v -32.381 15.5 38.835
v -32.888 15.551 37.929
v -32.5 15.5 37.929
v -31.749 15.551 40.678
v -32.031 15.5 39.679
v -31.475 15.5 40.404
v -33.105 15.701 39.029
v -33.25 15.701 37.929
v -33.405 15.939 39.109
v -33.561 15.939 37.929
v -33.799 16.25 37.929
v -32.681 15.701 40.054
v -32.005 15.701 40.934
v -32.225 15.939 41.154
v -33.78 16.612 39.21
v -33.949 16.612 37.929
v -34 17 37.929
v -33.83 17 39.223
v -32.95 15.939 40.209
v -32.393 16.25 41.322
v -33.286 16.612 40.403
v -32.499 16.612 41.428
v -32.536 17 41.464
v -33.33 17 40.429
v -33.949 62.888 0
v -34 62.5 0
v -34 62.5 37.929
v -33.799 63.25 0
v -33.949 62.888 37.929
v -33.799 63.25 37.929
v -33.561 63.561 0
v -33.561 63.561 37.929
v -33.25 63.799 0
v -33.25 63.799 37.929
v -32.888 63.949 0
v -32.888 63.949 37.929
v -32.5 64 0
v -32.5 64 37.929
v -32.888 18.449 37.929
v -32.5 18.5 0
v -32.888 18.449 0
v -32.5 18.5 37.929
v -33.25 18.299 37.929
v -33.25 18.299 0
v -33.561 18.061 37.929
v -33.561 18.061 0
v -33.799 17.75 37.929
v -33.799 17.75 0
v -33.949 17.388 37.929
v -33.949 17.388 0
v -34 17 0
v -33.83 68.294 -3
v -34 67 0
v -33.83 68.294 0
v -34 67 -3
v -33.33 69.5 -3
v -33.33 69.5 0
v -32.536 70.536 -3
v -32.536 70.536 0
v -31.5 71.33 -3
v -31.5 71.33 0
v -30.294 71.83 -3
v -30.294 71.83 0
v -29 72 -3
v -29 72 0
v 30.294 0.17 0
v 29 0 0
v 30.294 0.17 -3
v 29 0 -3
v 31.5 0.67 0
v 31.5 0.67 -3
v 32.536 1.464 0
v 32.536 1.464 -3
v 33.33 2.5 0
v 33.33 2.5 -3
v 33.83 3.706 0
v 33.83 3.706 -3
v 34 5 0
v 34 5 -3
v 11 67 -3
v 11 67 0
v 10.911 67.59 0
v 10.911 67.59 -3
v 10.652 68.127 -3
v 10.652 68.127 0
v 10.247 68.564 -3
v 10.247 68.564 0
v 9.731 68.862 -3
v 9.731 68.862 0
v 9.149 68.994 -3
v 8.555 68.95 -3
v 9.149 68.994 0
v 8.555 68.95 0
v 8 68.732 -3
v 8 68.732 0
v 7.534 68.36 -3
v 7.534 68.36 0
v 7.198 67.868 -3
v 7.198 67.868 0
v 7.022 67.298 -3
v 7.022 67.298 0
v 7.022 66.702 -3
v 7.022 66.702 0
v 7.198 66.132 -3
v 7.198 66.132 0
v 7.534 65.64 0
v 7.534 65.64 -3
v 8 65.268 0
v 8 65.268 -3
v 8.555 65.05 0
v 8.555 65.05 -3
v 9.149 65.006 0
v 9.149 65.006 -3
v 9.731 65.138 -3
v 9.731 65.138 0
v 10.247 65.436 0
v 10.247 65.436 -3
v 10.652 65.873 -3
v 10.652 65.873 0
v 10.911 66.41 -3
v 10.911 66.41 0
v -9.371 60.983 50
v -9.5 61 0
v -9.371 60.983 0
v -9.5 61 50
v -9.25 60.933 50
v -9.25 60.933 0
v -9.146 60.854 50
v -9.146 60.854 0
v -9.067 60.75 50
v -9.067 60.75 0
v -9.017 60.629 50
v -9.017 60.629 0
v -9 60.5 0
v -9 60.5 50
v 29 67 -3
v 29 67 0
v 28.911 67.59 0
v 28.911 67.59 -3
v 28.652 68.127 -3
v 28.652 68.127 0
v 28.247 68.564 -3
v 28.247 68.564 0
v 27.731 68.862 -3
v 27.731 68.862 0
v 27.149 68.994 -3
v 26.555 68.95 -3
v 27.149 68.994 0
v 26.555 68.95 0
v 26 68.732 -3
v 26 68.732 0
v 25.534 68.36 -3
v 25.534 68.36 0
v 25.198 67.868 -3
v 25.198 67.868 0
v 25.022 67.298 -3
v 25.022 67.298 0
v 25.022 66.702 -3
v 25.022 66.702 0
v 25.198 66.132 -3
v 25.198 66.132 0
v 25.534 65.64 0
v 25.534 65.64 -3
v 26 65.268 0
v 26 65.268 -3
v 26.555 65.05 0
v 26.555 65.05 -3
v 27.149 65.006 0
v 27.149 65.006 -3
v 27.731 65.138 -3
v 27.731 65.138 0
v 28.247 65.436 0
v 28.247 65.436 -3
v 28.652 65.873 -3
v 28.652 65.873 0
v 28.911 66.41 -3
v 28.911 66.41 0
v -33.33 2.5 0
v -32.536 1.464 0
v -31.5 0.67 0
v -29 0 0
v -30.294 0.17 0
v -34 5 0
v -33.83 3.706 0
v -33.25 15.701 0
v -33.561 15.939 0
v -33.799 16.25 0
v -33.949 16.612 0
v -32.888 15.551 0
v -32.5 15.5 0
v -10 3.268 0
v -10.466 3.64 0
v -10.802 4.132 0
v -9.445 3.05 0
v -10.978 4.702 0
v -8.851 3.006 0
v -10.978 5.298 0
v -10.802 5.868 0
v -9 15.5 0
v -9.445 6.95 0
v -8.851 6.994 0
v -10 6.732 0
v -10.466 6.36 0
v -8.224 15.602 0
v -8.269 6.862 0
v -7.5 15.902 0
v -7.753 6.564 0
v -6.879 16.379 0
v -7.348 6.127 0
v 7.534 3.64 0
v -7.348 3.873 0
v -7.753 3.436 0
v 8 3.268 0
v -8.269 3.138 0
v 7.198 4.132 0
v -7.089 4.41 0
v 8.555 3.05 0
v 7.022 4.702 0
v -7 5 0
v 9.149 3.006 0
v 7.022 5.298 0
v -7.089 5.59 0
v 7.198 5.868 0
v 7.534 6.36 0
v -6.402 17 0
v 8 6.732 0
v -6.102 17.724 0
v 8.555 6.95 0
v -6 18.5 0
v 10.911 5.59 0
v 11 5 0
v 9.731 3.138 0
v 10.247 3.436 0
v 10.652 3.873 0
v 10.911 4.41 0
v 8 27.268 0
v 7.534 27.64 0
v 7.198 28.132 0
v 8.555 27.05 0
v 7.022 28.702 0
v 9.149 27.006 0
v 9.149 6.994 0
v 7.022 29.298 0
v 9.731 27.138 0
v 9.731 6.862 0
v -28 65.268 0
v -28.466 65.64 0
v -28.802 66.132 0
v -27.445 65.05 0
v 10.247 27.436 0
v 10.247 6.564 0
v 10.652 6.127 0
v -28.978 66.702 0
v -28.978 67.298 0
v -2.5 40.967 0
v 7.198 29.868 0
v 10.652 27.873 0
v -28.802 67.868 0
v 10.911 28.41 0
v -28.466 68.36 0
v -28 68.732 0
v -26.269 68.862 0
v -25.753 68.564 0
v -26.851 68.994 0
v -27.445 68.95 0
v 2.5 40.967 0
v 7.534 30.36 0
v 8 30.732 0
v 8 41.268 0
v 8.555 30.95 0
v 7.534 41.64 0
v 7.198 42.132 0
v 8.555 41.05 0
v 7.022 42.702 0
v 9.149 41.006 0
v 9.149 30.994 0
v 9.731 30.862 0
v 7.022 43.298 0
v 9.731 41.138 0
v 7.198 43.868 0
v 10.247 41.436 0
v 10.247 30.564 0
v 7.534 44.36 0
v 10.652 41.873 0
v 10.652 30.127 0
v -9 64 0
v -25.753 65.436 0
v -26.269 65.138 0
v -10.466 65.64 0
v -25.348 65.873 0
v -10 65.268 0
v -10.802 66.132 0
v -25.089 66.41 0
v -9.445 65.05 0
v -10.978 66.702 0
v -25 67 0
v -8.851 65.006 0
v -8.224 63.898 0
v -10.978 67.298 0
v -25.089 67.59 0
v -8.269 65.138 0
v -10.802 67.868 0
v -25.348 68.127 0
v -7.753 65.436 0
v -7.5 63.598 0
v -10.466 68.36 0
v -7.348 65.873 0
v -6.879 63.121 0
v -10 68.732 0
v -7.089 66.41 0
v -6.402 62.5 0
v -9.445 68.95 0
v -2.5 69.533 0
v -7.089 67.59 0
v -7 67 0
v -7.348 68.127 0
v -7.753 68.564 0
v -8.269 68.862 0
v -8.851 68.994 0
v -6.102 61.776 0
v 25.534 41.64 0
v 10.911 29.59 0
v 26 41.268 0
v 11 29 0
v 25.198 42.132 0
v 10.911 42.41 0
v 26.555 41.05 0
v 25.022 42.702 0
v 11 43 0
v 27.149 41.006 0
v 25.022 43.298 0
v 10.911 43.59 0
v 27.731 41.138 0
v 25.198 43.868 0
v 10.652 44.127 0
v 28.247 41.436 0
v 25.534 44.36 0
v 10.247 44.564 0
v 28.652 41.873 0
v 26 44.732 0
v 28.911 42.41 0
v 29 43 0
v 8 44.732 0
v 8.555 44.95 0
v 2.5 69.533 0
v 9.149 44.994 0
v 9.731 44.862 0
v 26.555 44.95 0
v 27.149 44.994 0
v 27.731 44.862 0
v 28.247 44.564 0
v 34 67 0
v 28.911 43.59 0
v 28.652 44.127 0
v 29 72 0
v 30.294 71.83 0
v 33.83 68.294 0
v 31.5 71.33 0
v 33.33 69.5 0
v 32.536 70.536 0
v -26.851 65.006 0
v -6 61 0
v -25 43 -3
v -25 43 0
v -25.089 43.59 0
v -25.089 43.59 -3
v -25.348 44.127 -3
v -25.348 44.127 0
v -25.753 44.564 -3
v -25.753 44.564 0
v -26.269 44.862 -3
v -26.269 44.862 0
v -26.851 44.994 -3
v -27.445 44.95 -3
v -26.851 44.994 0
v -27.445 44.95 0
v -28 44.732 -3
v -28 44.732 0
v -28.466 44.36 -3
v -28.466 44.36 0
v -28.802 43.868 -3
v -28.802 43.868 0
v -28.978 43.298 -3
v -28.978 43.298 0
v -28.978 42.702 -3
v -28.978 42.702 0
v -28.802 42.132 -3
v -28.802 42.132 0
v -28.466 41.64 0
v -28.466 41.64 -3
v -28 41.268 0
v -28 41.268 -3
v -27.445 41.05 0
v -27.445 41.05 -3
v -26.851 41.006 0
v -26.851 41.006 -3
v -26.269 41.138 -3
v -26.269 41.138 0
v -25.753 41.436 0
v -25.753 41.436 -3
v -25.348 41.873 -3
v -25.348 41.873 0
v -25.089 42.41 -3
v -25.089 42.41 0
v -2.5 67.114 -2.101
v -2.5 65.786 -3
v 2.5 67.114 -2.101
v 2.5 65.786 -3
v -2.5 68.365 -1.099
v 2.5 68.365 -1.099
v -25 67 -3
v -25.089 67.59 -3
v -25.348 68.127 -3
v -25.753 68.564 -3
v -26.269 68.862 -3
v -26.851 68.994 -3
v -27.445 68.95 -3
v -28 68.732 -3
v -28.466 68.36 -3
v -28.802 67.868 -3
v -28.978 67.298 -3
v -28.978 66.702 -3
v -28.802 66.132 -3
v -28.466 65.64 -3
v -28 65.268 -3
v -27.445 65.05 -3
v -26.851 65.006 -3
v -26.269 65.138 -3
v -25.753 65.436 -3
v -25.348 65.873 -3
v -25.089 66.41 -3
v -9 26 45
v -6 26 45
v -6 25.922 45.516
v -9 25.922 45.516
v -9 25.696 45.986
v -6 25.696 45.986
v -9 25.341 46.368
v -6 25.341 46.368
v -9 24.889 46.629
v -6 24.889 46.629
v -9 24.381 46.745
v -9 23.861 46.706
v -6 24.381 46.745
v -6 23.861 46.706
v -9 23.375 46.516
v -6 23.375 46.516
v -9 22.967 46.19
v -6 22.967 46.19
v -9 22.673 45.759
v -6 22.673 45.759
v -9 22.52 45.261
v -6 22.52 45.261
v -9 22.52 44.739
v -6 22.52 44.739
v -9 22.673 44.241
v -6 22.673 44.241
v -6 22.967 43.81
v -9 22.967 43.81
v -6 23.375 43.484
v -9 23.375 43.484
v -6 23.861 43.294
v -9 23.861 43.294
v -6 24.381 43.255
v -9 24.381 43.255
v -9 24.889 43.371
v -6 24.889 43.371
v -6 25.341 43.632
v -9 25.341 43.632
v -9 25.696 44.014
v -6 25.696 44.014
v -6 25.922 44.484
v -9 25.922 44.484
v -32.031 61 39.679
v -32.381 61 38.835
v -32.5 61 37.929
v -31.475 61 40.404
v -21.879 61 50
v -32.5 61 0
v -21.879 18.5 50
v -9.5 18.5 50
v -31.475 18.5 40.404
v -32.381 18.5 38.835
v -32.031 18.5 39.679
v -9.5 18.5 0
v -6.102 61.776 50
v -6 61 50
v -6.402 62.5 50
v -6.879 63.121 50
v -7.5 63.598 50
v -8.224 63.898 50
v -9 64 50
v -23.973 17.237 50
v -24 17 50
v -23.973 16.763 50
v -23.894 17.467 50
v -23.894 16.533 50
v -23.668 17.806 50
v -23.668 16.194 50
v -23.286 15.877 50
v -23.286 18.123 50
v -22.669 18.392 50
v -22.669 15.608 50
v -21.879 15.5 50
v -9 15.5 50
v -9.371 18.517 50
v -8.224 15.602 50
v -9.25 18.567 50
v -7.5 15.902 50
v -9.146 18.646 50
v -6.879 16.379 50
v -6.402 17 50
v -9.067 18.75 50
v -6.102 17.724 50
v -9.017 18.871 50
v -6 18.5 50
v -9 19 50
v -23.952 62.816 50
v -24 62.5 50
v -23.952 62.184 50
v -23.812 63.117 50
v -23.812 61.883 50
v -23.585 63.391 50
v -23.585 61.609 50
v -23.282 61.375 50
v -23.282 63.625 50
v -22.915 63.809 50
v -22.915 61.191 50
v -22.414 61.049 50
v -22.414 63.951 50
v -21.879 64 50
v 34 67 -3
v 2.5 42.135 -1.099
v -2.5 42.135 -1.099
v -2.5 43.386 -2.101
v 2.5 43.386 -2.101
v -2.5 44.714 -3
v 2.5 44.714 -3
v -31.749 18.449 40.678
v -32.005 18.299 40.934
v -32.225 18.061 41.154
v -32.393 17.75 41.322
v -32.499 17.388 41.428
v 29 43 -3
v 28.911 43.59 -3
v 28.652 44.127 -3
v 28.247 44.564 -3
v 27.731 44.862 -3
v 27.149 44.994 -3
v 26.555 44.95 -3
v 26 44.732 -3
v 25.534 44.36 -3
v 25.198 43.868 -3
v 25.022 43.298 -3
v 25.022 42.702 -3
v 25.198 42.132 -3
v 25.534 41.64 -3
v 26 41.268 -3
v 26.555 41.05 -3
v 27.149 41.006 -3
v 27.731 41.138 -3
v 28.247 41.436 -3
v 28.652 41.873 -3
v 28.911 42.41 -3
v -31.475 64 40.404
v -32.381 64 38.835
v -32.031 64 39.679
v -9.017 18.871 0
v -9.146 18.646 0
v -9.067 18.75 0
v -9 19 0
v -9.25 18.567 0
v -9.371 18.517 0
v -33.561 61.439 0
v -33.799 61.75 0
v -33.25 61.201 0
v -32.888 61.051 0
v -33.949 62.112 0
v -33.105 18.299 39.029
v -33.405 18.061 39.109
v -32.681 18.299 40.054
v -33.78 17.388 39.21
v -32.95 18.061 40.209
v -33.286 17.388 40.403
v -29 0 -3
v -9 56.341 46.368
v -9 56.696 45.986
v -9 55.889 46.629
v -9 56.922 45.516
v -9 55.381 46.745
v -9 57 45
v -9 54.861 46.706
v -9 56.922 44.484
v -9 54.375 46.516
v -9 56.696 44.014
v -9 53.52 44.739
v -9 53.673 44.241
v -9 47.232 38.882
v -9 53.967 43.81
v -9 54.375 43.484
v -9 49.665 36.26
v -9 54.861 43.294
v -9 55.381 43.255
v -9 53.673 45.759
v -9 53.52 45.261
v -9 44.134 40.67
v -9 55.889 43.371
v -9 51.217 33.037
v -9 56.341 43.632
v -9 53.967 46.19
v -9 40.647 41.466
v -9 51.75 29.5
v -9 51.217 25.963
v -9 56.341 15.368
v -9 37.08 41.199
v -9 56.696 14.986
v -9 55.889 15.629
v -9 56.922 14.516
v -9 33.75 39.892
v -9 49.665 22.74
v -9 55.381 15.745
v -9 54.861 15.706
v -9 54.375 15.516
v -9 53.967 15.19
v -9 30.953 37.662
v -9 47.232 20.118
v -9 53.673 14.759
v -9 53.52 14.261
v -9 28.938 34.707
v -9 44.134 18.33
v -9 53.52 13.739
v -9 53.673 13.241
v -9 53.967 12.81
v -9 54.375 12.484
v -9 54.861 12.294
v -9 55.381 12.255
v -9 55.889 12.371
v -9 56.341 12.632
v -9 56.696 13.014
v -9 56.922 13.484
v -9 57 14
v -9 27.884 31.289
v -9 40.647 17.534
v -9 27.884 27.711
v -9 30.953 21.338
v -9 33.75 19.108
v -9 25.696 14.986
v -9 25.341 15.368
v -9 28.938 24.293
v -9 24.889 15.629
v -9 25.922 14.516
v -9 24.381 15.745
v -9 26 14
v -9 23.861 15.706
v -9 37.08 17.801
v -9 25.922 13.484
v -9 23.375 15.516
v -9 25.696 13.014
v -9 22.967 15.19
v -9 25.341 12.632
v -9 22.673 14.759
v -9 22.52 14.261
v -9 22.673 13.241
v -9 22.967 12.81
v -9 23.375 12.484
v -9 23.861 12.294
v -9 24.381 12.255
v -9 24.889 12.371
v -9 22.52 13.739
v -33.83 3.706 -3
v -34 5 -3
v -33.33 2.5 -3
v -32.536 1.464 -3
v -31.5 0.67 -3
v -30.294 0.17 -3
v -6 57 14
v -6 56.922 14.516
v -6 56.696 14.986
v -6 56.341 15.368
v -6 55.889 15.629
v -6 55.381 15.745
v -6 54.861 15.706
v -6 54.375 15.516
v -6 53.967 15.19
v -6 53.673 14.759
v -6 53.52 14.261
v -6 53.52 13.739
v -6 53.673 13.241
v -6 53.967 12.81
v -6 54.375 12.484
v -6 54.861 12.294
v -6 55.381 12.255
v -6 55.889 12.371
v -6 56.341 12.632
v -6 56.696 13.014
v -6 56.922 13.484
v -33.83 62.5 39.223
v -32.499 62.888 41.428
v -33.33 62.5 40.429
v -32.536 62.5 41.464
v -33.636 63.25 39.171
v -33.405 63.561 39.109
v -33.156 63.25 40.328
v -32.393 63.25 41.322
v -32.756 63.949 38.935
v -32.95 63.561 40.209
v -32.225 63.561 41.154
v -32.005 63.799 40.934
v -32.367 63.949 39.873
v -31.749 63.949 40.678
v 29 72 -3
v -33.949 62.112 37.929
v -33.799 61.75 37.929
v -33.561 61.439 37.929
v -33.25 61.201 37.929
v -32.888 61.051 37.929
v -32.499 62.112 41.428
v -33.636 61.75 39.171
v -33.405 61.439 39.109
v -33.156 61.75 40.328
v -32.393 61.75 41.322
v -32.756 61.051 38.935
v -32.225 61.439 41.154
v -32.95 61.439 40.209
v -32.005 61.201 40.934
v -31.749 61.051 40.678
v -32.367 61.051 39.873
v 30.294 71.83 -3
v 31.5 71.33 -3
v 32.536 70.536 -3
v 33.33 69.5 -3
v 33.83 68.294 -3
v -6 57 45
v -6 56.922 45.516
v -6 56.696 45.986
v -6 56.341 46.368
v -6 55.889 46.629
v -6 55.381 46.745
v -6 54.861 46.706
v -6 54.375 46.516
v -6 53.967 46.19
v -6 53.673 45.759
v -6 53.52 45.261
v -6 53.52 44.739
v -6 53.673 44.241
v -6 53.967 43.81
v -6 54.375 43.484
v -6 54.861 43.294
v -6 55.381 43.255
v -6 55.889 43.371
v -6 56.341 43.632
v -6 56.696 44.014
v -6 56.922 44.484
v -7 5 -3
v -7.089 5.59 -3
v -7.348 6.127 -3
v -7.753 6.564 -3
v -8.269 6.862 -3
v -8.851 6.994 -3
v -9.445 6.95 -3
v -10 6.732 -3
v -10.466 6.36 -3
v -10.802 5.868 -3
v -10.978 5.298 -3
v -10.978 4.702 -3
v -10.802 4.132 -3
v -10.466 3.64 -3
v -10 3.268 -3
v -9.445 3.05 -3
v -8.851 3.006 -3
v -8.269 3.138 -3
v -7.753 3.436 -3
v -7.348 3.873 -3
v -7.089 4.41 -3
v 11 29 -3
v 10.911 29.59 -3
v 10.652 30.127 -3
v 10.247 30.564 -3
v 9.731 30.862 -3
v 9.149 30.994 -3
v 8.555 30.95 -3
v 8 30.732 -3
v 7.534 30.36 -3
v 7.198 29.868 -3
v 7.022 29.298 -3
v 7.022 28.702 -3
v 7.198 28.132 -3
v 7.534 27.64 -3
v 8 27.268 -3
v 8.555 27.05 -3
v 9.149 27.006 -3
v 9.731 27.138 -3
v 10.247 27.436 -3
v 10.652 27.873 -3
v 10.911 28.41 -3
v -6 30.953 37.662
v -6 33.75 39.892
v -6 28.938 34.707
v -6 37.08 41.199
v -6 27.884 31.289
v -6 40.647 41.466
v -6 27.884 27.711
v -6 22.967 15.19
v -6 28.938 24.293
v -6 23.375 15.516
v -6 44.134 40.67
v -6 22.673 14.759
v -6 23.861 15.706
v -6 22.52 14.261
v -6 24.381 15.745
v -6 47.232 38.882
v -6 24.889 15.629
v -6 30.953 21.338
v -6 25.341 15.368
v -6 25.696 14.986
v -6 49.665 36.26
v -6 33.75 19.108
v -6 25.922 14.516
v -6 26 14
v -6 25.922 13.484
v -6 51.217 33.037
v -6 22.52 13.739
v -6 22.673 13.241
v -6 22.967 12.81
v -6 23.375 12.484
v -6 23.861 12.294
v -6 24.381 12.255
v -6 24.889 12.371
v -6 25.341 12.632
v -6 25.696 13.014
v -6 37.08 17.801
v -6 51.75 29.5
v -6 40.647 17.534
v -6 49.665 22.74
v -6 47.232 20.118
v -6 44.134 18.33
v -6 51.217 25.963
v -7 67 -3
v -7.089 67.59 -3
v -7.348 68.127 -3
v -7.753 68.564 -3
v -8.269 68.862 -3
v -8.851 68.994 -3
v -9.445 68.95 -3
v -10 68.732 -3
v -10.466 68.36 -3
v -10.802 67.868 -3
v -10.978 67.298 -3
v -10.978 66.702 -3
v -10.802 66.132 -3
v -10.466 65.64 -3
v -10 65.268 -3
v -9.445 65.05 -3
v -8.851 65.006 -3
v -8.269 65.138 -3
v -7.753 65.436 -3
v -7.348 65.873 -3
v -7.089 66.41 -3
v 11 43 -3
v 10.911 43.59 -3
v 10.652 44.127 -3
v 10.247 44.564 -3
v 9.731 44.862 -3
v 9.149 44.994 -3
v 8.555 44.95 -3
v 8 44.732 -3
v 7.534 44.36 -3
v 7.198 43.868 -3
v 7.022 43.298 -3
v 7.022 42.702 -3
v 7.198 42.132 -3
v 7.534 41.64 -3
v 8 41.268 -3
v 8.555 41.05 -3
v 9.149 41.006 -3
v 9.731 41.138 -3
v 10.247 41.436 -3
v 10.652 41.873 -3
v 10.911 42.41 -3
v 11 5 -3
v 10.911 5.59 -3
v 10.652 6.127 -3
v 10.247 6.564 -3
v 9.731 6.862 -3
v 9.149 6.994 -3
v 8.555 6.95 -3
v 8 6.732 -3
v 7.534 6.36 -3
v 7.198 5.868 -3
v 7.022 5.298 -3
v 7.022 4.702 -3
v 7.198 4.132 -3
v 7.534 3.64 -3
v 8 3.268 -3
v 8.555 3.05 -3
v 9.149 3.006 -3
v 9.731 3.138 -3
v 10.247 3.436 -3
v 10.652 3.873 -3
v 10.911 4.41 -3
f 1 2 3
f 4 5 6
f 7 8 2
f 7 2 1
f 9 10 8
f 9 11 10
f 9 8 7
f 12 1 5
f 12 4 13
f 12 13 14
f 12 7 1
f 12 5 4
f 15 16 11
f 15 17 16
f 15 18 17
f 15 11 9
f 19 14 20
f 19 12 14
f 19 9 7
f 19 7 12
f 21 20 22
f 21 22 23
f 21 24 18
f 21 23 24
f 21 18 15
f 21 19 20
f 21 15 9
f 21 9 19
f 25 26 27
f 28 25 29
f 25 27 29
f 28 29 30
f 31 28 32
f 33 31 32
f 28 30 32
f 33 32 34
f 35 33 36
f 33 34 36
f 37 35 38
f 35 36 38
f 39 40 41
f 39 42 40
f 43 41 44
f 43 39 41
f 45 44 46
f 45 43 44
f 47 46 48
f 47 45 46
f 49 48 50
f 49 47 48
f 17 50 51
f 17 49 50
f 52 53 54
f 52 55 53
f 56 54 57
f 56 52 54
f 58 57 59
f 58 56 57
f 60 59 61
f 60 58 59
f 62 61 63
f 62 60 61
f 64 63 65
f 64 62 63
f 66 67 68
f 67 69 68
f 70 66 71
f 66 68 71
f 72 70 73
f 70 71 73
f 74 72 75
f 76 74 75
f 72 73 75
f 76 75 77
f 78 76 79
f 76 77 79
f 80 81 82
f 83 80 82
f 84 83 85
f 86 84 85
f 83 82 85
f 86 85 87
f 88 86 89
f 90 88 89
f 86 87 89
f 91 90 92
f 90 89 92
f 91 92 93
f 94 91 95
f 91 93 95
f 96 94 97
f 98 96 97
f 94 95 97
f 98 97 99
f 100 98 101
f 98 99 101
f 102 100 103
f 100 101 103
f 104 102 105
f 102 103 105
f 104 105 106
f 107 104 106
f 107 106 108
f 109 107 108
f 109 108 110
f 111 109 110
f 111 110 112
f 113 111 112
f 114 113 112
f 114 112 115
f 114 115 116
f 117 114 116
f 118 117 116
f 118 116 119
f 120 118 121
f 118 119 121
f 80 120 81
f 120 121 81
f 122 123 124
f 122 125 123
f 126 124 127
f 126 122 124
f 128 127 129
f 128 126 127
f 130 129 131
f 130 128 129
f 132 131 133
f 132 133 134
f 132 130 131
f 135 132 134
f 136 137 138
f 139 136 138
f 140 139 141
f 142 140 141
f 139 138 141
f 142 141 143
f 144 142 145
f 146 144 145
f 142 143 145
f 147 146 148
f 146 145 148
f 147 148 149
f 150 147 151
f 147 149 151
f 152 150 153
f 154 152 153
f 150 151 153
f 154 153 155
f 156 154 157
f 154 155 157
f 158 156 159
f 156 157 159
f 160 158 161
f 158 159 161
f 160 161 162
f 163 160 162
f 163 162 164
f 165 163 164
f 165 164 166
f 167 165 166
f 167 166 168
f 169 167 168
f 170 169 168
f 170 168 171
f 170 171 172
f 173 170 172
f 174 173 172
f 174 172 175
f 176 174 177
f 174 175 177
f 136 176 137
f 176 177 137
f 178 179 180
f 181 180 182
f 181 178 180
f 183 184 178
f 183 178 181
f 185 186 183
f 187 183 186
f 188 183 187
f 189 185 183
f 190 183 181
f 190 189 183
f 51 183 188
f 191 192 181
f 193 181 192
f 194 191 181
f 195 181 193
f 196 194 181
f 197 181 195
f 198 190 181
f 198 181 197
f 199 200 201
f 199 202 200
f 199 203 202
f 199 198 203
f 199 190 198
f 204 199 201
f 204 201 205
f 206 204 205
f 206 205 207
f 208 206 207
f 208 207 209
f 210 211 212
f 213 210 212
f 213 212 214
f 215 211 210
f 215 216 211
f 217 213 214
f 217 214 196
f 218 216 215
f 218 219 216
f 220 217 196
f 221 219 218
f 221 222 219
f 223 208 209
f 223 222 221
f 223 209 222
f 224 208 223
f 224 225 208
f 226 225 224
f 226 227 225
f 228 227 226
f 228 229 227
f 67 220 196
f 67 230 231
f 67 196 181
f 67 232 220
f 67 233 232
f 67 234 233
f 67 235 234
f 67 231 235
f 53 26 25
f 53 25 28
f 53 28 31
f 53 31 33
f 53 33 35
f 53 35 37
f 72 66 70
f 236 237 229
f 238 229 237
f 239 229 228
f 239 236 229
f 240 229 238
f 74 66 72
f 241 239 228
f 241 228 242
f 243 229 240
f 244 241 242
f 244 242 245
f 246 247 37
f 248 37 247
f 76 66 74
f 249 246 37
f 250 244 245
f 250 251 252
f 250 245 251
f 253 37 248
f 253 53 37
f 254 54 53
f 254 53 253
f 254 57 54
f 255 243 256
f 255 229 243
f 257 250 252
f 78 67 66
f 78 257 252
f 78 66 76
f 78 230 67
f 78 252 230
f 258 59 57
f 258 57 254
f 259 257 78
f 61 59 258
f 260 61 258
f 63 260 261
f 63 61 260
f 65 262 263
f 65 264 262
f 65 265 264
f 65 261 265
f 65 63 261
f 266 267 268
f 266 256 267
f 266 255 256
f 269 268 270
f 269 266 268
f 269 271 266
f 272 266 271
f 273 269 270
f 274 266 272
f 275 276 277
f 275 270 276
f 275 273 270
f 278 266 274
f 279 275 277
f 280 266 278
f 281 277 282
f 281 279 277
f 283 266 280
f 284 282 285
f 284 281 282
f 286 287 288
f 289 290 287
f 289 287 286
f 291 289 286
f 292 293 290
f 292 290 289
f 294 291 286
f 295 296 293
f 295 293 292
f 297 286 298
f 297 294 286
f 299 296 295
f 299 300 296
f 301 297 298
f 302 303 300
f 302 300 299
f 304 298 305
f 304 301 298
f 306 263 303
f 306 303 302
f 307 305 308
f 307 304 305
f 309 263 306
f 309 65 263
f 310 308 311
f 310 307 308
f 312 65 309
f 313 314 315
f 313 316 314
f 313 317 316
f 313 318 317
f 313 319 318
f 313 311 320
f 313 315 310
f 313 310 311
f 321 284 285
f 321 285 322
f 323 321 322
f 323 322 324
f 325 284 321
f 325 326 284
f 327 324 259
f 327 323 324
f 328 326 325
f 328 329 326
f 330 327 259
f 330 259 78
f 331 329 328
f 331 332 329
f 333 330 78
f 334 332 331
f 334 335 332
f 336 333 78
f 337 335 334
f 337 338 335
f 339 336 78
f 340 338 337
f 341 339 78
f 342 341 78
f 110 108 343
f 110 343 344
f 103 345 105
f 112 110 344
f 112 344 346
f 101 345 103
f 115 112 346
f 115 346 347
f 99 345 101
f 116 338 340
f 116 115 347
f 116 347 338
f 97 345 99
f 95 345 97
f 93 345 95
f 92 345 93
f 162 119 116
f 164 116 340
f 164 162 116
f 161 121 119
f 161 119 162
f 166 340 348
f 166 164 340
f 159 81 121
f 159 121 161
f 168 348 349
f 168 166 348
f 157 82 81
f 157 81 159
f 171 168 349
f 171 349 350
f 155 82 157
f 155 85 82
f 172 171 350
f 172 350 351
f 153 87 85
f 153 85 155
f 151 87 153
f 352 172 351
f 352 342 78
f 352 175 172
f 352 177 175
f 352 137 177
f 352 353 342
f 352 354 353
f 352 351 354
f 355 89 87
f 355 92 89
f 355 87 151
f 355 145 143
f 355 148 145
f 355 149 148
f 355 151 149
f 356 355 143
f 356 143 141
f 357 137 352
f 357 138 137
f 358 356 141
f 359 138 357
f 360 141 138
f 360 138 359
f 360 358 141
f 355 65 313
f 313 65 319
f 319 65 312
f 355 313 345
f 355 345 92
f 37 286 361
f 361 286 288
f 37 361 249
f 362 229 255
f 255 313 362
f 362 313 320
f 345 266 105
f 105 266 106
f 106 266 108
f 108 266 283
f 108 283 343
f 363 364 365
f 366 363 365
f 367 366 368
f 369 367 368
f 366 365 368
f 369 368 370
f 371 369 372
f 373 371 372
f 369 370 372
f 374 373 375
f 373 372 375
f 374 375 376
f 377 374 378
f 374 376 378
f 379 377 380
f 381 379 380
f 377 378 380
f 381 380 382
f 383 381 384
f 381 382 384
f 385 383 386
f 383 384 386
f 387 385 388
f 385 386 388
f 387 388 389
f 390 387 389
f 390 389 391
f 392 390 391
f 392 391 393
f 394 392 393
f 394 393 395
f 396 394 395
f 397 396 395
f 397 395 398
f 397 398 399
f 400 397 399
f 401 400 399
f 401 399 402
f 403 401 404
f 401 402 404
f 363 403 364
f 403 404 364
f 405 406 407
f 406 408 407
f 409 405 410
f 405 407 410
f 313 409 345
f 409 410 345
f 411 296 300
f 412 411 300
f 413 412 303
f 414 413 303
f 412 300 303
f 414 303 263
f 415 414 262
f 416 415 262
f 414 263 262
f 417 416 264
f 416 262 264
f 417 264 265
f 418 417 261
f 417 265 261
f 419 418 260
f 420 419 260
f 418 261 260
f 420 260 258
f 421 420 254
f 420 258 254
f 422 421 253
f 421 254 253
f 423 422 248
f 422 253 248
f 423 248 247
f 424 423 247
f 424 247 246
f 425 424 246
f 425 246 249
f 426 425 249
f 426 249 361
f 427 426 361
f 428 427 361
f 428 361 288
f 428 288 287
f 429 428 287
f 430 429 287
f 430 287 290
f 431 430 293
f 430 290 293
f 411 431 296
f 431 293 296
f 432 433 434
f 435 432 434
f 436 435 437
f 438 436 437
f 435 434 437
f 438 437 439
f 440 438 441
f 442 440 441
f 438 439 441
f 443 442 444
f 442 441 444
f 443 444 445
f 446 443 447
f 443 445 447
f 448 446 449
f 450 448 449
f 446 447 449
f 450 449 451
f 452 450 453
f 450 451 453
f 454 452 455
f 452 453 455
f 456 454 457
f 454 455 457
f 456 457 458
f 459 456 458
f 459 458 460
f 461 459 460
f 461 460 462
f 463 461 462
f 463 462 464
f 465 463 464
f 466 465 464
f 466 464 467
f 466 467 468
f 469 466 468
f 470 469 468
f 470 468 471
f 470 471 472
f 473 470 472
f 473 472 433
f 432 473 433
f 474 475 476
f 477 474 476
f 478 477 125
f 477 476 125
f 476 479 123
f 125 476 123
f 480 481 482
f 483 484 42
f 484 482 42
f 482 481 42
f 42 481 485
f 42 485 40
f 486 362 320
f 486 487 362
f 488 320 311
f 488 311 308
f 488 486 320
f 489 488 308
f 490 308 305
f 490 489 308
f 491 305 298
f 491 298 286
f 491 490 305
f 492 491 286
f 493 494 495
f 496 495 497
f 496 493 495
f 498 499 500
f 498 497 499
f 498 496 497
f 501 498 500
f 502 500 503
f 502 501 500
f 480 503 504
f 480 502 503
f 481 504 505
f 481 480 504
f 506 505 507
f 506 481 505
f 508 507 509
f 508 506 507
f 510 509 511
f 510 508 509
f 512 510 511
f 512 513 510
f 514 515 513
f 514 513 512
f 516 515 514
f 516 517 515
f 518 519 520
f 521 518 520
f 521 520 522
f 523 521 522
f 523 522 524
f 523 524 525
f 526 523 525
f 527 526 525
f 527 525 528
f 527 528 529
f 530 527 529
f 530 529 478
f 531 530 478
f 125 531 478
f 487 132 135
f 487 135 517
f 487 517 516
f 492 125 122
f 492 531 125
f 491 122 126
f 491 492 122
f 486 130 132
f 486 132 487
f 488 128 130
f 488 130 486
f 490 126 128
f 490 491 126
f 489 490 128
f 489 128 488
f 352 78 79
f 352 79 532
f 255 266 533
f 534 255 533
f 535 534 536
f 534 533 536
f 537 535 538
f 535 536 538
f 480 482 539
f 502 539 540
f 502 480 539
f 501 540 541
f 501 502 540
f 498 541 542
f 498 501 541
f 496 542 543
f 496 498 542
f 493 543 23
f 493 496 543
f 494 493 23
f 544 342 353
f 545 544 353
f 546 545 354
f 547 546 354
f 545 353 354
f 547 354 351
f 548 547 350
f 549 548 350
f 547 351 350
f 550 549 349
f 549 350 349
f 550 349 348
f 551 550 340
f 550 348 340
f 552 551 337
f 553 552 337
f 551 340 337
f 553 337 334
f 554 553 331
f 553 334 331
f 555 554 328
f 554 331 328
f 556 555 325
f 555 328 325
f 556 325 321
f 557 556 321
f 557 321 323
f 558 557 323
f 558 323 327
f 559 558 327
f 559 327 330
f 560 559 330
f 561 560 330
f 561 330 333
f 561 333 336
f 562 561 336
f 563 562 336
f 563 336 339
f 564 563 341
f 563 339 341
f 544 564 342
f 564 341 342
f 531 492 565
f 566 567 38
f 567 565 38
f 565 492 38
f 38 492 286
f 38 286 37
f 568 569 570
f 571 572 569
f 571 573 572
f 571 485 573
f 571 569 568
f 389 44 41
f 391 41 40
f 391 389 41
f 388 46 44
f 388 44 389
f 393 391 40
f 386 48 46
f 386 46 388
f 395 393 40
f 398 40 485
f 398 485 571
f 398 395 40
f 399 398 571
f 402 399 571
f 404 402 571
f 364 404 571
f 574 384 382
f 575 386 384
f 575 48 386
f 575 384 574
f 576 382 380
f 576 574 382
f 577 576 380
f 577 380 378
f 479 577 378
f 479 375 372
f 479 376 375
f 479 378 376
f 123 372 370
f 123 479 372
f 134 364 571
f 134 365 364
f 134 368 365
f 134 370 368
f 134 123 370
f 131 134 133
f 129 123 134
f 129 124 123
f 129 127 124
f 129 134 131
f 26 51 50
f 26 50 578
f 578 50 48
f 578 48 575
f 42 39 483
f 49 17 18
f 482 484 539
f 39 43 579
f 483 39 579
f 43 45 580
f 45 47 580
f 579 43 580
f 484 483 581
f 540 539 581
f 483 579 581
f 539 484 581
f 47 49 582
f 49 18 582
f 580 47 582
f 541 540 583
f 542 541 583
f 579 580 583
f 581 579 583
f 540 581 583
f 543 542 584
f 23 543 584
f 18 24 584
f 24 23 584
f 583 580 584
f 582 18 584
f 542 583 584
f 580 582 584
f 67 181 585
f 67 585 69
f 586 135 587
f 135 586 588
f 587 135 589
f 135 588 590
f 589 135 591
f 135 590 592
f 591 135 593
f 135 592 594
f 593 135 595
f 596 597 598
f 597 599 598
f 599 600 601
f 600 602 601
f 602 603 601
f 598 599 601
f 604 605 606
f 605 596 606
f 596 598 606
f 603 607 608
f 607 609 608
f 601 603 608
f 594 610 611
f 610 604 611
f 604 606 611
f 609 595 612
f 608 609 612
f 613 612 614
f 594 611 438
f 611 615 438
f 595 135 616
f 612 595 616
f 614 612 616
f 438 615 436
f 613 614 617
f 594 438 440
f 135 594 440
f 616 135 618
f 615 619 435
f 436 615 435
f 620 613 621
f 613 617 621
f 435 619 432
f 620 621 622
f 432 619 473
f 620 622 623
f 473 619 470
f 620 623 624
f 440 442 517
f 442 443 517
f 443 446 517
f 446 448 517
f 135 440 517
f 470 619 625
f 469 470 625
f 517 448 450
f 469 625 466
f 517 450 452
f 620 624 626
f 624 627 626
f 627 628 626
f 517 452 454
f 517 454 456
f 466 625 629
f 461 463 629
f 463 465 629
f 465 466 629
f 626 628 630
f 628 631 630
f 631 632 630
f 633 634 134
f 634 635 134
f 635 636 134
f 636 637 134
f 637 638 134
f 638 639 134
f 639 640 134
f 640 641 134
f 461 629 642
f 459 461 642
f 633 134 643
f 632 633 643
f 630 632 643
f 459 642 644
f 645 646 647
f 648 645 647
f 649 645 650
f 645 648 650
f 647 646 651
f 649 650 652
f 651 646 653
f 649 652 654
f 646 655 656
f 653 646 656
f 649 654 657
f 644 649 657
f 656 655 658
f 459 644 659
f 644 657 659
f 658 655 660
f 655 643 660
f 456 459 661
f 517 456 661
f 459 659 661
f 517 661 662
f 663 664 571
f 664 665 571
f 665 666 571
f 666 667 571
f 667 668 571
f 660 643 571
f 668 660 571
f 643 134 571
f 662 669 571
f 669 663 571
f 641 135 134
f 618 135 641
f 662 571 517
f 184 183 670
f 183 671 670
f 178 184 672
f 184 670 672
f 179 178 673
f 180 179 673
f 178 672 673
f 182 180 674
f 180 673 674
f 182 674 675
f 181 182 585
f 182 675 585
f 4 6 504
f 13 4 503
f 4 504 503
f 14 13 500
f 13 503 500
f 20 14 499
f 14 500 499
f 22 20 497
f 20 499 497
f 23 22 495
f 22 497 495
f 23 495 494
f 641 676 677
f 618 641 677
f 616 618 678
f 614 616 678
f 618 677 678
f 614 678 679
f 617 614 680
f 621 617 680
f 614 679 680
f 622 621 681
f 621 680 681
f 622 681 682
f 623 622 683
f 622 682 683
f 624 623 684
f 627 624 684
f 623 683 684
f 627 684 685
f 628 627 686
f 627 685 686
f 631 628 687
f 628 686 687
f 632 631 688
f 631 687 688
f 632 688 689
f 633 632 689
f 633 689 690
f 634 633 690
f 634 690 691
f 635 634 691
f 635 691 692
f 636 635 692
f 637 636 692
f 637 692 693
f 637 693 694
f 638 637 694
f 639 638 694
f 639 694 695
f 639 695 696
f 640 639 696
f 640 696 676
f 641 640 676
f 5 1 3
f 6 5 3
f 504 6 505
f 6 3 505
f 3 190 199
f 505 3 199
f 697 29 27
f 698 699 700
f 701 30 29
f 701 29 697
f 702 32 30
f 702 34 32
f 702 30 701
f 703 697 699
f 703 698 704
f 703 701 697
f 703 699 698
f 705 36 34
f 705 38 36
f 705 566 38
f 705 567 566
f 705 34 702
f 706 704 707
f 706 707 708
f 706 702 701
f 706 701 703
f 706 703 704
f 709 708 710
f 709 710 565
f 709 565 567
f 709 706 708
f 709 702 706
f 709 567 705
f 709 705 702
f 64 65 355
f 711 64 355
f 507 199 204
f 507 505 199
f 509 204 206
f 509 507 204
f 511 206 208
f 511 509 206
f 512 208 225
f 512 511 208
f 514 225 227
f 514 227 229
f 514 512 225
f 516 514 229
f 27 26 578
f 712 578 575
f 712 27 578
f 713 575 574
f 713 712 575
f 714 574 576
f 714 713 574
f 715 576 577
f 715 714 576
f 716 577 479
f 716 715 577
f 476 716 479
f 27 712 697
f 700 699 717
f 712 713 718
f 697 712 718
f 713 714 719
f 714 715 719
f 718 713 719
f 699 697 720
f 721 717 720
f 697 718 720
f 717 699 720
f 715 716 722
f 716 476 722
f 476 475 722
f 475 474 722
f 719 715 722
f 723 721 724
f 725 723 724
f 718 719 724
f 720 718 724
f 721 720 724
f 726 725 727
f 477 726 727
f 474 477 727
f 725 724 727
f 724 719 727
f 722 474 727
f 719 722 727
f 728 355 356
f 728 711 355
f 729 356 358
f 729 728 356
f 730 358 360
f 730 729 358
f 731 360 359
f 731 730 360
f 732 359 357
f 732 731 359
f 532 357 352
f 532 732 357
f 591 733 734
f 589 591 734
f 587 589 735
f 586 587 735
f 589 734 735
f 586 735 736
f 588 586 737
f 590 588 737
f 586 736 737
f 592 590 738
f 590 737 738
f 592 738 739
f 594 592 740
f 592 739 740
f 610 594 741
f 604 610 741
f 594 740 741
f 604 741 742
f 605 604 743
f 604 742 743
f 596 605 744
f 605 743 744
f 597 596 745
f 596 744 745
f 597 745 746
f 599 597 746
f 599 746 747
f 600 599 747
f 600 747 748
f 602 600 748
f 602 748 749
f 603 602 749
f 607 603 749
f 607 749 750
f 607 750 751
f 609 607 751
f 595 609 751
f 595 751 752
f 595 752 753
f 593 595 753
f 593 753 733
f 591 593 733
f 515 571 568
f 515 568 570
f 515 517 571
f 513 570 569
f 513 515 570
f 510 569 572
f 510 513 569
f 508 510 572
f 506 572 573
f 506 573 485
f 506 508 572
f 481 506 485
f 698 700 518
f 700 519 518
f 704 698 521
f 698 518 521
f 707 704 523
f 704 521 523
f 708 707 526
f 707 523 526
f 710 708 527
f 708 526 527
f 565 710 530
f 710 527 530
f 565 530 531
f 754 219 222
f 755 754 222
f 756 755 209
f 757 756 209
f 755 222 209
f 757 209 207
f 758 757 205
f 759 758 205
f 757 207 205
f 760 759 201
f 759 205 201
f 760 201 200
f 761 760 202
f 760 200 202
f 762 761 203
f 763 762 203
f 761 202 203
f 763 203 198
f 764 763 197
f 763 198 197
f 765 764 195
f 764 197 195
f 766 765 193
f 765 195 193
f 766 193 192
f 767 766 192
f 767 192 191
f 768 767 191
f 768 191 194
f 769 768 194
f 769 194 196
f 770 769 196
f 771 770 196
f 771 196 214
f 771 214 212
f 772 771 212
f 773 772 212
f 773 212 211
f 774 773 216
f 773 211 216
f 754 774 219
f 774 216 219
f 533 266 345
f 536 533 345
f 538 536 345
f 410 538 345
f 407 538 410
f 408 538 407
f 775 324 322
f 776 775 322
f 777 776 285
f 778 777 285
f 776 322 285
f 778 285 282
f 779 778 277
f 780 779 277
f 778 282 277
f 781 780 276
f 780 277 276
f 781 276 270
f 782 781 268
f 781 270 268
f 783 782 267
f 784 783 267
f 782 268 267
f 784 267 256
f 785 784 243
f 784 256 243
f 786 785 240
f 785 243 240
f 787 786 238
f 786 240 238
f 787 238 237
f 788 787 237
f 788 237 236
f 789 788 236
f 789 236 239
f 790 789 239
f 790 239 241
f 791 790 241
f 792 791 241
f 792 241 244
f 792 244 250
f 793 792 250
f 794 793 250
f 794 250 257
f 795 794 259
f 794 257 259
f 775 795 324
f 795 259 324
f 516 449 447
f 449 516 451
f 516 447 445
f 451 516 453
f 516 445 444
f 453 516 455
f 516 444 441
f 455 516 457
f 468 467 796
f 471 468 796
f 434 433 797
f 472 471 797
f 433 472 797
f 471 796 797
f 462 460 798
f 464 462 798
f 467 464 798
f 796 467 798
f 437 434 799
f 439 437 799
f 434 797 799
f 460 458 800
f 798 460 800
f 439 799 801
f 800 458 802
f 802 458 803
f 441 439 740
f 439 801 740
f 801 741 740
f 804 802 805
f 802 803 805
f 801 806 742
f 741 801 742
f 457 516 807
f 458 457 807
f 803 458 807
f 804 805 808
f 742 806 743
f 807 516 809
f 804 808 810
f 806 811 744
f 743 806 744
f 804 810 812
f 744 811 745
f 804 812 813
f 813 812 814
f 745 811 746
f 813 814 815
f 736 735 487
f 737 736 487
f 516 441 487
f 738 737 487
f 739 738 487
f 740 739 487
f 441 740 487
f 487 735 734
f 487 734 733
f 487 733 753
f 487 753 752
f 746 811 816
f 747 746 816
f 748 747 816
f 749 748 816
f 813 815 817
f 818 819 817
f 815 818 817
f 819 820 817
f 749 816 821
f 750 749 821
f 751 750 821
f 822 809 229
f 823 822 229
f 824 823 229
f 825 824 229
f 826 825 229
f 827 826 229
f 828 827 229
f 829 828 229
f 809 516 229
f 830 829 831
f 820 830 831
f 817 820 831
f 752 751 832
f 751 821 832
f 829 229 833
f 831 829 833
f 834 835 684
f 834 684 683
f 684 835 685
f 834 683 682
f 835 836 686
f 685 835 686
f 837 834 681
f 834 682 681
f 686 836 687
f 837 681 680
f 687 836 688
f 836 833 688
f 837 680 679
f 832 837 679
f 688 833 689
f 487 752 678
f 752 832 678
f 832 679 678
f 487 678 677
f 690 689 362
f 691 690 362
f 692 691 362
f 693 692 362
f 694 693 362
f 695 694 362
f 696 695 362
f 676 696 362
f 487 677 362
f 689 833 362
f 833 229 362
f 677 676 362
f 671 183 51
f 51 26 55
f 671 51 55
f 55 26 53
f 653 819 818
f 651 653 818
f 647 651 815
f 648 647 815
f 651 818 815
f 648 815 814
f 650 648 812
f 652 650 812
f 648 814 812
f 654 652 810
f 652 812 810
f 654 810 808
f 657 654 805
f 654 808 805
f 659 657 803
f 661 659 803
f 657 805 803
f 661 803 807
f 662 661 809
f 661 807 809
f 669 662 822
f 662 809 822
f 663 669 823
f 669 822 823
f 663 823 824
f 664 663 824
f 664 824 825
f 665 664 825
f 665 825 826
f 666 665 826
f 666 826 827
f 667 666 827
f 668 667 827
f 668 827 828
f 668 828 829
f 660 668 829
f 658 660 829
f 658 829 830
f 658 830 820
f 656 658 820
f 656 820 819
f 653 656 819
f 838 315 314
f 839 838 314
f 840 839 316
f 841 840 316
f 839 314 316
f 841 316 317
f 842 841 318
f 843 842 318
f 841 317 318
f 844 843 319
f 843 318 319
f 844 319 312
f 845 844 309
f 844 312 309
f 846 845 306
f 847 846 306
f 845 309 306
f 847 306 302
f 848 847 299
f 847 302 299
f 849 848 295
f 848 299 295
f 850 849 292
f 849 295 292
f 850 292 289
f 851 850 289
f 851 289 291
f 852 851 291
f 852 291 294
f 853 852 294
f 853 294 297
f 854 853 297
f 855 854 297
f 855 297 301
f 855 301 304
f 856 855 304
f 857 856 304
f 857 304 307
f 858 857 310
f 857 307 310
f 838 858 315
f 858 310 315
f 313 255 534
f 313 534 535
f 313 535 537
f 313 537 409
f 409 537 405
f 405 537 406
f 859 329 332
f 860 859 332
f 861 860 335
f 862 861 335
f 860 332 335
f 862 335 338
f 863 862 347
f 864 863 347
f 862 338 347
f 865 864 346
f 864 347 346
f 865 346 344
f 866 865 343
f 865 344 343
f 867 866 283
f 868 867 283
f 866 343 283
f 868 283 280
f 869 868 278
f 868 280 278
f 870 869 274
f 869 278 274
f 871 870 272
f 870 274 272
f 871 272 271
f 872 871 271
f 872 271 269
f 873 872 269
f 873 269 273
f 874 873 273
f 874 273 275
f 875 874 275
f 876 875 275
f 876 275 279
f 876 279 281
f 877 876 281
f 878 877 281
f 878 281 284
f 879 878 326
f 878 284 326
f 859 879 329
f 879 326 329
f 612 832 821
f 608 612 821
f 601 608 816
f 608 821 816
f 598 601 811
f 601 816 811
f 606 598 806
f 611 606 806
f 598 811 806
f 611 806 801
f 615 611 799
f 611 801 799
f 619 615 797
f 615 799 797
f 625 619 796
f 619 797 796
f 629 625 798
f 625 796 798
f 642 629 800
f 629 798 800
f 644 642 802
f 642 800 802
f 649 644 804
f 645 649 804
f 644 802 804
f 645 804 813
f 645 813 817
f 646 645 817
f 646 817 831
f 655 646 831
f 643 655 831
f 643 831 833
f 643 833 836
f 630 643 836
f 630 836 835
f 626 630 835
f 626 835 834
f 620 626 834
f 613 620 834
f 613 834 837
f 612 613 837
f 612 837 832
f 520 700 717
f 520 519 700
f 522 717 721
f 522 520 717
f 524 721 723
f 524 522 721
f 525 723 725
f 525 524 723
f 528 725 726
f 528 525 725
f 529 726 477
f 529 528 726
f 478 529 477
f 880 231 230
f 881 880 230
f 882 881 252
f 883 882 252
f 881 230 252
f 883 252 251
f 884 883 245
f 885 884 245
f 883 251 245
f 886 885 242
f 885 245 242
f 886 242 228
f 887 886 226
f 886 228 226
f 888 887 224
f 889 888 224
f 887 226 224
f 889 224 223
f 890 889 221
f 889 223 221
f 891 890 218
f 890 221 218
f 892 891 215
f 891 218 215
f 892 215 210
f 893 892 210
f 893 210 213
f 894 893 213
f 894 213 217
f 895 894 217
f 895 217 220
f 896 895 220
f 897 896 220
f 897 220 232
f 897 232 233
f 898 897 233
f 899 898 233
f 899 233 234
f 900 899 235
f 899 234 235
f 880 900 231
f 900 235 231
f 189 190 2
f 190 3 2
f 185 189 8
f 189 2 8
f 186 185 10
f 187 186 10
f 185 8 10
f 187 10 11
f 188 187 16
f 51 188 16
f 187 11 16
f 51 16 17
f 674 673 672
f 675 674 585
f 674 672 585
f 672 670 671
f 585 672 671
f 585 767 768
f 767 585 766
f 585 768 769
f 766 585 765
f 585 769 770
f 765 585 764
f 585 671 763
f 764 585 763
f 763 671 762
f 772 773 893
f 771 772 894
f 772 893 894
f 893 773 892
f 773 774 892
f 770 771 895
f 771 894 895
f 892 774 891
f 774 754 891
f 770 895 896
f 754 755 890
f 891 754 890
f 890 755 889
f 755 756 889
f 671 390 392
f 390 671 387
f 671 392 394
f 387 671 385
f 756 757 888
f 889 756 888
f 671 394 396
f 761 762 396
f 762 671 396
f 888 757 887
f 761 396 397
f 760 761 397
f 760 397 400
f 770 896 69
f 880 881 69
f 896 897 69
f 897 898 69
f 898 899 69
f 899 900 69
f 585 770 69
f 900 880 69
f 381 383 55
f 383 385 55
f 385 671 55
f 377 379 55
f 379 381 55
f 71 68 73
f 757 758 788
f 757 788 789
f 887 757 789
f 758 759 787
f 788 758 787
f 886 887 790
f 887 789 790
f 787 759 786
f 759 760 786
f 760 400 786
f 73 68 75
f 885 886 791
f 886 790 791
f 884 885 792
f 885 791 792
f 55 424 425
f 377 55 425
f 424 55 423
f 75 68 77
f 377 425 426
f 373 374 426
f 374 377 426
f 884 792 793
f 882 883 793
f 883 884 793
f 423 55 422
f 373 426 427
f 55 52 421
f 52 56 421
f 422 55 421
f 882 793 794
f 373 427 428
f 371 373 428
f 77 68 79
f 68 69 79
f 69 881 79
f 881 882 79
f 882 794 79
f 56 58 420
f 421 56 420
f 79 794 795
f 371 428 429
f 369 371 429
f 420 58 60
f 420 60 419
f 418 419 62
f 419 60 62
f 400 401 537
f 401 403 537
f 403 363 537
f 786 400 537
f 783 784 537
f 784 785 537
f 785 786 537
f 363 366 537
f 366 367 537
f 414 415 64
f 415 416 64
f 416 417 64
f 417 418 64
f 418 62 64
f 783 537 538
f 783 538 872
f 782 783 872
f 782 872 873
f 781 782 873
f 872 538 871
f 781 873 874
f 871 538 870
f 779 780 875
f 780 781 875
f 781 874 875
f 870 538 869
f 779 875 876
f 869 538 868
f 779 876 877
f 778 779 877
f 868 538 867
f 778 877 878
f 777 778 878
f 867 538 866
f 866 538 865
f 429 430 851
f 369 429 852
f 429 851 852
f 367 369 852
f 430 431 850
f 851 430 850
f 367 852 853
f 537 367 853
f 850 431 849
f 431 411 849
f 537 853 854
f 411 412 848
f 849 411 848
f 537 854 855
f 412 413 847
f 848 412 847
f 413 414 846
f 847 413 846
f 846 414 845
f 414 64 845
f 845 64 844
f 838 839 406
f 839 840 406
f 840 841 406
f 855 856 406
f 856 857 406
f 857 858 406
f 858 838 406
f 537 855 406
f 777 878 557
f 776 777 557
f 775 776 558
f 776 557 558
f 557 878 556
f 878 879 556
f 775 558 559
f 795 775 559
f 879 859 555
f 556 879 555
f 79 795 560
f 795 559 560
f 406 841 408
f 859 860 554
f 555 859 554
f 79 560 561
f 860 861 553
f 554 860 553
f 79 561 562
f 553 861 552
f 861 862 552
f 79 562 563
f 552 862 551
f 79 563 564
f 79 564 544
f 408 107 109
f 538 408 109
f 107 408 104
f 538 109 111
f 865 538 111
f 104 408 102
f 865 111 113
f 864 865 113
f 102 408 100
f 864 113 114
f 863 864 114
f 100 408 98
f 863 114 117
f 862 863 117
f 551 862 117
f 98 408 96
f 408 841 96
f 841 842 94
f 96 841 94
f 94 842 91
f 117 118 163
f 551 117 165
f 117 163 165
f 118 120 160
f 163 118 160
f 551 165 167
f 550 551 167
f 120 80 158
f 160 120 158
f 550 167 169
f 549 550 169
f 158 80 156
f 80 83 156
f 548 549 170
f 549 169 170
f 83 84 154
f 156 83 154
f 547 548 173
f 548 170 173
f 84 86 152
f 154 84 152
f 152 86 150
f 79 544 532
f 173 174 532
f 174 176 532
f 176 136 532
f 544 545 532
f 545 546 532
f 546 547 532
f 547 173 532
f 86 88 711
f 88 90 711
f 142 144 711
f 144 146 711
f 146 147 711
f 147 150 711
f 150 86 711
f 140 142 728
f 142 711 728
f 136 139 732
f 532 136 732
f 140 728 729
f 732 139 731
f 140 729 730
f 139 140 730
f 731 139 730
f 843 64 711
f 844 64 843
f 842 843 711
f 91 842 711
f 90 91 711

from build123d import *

# Parameters (mm, degrees)
F0_W      = 68
F0_H      = 72
F0_R      = 2
F1_DEPTH  = 3
F3_DEPTH  = 50
F4_SIZE   = 10
F6_R      = 1.75
F6_R_2    = 12
F7_DEPTH  = 25
F8_R      = 5
F9_R      = 1.49999
F10_R     = 3
F11_R     = 0.5
F13_R     = 20
F13_R_2   = 1.75
F14_DEPTH = 2.5


# Not quite as in the source:
# - a fillet or chamfer is up to 0.001 mm smaller than in the source, because OpenCascade refuses the exact size


with BuildPart() as f1:
    # F0 (on Top) → F1 (new body)
    with BuildSketch(Plane.XY):
        with Locations((0, 36)):
            Rectangle(F0_W, F0_H)
        with Locations((-9, 5)):
            Circle(F0_R, mode=Mode.SUBTRACT)
        with Locations((-9, 29)):
            Circle(F0_R, mode=Mode.SUBTRACT)
        with Locations((9, 5)):
            Circle(F0_R, mode=Mode.SUBTRACT)
        with Locations((9, 29)):
            Circle(F0_R, mode=Mode.SUBTRACT)
        with Locations((-27, 43)):
            Circle(F0_R, mode=Mode.SUBTRACT)
        with Locations((-9, 43)):
            Circle(F0_R, mode=Mode.SUBTRACT)
        with Locations((-27, 67)):
            Circle(F0_R, mode=Mode.SUBTRACT)
        with Locations((-9, 67)):
            Circle(F0_R, mode=Mode.SUBTRACT)
        with Locations((9, 43)):
            Circle(F0_R, mode=Mode.SUBTRACT)
        with Locations((27, 43)):
            Circle(F0_R, mode=Mode.SUBTRACT)
        with Locations((9, 67)):
            Circle(F0_R, mode=Mode.SUBTRACT)
        with Locations((27, 67)):
            Circle(F0_R, mode=Mode.SUBTRACT)
        with Locations((-9, 43)):
            Circle(F0_R)
        with Locations((-9, 29)):
            Circle(F0_R)
    extrude(amount=-F1_DEPTH)

    # F2 (on Top) → F3 (join)
    with BuildSketch(Plane.XY):
        Polygon((-6, 64), (-34, 64), (-34, 61), (-9, 61), (-9, 18.5), (-34, 18.5), (-34, 15.5), (-6, 15.5), align=None)
    extrude(amount=F3_DEPTH)

    # F4
    f4_edges = [f1.edges().sort_by_distance(p)[0] for p in [
        (-34, 62.5, 50),
        (-34, 17, 50),
    ]]
    chamfer(f4_edges, length=F4_SIZE)

    # F6 (on face) → F7 (cut)
    with BuildSketch(Plane.YZ.offset(-6)):
        with Locations((55.25, 45)):
            Circle(F6_R)
        with Locations((39.75, 29.5)):
            Circle(F6_R_2)
        with Locations((55.25, 14)):
            Circle(F6_R)
        with Locations((24.25, 45)):
            Circle(F6_R)
        with Locations((24.25, 14)):
            Circle(F6_R)
    extrude(amount=-F7_DEPTH, mode=Mode.SUBTRACT)

    # F8
    f8_edges = [f1.edges().sort_by_distance(p)[0] for p in [
        (-34, 72, -1.5),
        (34, 72, -1.5),
        (34, 0, -1.5),
        (-34, 0, -1.5),
        (-34, 17, 40),
        (-34, 62.5, 40),
    ]]
    fillet(f8_edges, radius=F8_R)

    # F9 (radius 1.5 in the source; OpenCascade refuses exactly that, so slightly less here)
    f9_edges = [f1.edges().sort_by_distance(p)[0] for p in [
        (-34, 64, 18.964466),
        (-34, 61, 18.964466),
        (-28.267767, 15.5, 45.732233),
        (-28.267767, 18.5, 45.732233),
        (-33.619398, 15.5, 39.842349),
        (-34, 15.5, 18.964466),
        (-34, 18.5, 18.964466),
        (-33.619398, 18.5, 39.842349),
        (-33.619398, 64, 39.842349),
        (-33.619398, 61, 39.842349),
        (-28.267767, 61, 45.732233),
        (-28.267767, 64, 45.732233),
    ]]
    fillet(f9_edges, radius=F9_R)

    # F10
    f10_edges = [f1.edges().sort_by_distance(p)[0] for p in [
        (-6, 15.5, 25),
        (-6, 64, 25),
    ]]
    fillet(f10_edges, radius=F10_R)

    # F11
    f11_edges = [f1.edges().sort_by_distance(p)[0] for p in [
        (-9, 18.5, 25),
        (-9, 61, 25),
    ]]
    fillet(f11_edges, radius=F11_R)

    # F13 (on offset) → F14 (cut, symmetric)
    with BuildSketch(Plane.YZ):
        with Locations((55.25, 14)):
            Circle(F13_R)
        with Locations((55.25, 14)):
            Circle(F13_R_2, mode=Mode.SUBTRACT)
    extrude(amount=F14_DEPTH, both=True, mode=Mode.SUBTRACT)


solid = f1.part
